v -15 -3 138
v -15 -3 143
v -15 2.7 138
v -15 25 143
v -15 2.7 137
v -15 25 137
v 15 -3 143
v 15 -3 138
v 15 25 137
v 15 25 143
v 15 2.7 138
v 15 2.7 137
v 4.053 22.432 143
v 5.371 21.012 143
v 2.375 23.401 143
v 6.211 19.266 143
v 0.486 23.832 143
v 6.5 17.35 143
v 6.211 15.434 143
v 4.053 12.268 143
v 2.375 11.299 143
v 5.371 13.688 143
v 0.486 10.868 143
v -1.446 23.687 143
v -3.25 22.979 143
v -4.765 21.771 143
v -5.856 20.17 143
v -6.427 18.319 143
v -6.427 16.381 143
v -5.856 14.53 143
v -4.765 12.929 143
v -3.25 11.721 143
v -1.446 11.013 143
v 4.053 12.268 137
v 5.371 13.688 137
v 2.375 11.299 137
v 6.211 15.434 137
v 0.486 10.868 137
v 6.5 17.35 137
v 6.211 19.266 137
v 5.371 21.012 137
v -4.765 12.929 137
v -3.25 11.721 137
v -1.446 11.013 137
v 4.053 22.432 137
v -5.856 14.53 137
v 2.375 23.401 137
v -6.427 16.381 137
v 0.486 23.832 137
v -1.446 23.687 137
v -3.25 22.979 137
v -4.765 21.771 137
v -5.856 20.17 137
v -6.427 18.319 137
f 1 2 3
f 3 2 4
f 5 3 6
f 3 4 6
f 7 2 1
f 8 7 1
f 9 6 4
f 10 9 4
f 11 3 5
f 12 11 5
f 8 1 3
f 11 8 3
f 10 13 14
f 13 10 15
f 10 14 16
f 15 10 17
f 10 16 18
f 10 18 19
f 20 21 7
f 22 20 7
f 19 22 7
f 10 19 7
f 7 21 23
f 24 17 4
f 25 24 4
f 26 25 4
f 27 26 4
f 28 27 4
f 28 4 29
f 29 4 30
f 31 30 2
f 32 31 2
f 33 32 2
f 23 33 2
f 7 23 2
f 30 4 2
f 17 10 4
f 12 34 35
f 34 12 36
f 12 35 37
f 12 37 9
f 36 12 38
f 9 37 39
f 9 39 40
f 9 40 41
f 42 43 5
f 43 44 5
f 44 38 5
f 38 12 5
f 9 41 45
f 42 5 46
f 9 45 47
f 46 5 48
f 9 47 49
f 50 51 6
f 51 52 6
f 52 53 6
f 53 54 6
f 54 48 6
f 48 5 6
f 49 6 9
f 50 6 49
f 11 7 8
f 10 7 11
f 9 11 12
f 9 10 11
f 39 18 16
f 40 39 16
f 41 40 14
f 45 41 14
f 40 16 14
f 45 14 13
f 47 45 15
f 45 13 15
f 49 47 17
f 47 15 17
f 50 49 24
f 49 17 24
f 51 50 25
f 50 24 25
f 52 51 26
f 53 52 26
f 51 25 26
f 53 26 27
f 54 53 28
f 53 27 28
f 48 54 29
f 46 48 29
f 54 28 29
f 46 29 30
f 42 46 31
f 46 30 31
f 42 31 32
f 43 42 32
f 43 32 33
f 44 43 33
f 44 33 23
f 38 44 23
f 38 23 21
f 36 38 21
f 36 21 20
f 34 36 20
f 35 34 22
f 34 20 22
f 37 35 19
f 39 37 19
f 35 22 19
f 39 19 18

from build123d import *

# Parameters (mm, degrees)
BODY_DEPTH         = 30
SKETCH_4_R         = 6.5
BEARING_HOLE_DEPTH = 6


with BuildPart() as part:
    # Эскиз1 → Body (new body)
    with BuildSketch(Plane.ZY.offset(15)):
        Polygon((137, 2.7), (137, 25), (143, 25), (143, -3), (138, -3), (138, 2.7), align=None)
    extrude(amount=-BODY_DEPTH)

    # Эскиз4 → Bearing_Hole (cut)
    with BuildSketch(Plane.XY.offset(143)):
        with Locations((0, 17.35)):
            Circle(SKETCH_4_R)
    extrude(amount=-BEARING_HOLE_DEPTH, mode=Mode.SUBTRACT)


solid = part.part
